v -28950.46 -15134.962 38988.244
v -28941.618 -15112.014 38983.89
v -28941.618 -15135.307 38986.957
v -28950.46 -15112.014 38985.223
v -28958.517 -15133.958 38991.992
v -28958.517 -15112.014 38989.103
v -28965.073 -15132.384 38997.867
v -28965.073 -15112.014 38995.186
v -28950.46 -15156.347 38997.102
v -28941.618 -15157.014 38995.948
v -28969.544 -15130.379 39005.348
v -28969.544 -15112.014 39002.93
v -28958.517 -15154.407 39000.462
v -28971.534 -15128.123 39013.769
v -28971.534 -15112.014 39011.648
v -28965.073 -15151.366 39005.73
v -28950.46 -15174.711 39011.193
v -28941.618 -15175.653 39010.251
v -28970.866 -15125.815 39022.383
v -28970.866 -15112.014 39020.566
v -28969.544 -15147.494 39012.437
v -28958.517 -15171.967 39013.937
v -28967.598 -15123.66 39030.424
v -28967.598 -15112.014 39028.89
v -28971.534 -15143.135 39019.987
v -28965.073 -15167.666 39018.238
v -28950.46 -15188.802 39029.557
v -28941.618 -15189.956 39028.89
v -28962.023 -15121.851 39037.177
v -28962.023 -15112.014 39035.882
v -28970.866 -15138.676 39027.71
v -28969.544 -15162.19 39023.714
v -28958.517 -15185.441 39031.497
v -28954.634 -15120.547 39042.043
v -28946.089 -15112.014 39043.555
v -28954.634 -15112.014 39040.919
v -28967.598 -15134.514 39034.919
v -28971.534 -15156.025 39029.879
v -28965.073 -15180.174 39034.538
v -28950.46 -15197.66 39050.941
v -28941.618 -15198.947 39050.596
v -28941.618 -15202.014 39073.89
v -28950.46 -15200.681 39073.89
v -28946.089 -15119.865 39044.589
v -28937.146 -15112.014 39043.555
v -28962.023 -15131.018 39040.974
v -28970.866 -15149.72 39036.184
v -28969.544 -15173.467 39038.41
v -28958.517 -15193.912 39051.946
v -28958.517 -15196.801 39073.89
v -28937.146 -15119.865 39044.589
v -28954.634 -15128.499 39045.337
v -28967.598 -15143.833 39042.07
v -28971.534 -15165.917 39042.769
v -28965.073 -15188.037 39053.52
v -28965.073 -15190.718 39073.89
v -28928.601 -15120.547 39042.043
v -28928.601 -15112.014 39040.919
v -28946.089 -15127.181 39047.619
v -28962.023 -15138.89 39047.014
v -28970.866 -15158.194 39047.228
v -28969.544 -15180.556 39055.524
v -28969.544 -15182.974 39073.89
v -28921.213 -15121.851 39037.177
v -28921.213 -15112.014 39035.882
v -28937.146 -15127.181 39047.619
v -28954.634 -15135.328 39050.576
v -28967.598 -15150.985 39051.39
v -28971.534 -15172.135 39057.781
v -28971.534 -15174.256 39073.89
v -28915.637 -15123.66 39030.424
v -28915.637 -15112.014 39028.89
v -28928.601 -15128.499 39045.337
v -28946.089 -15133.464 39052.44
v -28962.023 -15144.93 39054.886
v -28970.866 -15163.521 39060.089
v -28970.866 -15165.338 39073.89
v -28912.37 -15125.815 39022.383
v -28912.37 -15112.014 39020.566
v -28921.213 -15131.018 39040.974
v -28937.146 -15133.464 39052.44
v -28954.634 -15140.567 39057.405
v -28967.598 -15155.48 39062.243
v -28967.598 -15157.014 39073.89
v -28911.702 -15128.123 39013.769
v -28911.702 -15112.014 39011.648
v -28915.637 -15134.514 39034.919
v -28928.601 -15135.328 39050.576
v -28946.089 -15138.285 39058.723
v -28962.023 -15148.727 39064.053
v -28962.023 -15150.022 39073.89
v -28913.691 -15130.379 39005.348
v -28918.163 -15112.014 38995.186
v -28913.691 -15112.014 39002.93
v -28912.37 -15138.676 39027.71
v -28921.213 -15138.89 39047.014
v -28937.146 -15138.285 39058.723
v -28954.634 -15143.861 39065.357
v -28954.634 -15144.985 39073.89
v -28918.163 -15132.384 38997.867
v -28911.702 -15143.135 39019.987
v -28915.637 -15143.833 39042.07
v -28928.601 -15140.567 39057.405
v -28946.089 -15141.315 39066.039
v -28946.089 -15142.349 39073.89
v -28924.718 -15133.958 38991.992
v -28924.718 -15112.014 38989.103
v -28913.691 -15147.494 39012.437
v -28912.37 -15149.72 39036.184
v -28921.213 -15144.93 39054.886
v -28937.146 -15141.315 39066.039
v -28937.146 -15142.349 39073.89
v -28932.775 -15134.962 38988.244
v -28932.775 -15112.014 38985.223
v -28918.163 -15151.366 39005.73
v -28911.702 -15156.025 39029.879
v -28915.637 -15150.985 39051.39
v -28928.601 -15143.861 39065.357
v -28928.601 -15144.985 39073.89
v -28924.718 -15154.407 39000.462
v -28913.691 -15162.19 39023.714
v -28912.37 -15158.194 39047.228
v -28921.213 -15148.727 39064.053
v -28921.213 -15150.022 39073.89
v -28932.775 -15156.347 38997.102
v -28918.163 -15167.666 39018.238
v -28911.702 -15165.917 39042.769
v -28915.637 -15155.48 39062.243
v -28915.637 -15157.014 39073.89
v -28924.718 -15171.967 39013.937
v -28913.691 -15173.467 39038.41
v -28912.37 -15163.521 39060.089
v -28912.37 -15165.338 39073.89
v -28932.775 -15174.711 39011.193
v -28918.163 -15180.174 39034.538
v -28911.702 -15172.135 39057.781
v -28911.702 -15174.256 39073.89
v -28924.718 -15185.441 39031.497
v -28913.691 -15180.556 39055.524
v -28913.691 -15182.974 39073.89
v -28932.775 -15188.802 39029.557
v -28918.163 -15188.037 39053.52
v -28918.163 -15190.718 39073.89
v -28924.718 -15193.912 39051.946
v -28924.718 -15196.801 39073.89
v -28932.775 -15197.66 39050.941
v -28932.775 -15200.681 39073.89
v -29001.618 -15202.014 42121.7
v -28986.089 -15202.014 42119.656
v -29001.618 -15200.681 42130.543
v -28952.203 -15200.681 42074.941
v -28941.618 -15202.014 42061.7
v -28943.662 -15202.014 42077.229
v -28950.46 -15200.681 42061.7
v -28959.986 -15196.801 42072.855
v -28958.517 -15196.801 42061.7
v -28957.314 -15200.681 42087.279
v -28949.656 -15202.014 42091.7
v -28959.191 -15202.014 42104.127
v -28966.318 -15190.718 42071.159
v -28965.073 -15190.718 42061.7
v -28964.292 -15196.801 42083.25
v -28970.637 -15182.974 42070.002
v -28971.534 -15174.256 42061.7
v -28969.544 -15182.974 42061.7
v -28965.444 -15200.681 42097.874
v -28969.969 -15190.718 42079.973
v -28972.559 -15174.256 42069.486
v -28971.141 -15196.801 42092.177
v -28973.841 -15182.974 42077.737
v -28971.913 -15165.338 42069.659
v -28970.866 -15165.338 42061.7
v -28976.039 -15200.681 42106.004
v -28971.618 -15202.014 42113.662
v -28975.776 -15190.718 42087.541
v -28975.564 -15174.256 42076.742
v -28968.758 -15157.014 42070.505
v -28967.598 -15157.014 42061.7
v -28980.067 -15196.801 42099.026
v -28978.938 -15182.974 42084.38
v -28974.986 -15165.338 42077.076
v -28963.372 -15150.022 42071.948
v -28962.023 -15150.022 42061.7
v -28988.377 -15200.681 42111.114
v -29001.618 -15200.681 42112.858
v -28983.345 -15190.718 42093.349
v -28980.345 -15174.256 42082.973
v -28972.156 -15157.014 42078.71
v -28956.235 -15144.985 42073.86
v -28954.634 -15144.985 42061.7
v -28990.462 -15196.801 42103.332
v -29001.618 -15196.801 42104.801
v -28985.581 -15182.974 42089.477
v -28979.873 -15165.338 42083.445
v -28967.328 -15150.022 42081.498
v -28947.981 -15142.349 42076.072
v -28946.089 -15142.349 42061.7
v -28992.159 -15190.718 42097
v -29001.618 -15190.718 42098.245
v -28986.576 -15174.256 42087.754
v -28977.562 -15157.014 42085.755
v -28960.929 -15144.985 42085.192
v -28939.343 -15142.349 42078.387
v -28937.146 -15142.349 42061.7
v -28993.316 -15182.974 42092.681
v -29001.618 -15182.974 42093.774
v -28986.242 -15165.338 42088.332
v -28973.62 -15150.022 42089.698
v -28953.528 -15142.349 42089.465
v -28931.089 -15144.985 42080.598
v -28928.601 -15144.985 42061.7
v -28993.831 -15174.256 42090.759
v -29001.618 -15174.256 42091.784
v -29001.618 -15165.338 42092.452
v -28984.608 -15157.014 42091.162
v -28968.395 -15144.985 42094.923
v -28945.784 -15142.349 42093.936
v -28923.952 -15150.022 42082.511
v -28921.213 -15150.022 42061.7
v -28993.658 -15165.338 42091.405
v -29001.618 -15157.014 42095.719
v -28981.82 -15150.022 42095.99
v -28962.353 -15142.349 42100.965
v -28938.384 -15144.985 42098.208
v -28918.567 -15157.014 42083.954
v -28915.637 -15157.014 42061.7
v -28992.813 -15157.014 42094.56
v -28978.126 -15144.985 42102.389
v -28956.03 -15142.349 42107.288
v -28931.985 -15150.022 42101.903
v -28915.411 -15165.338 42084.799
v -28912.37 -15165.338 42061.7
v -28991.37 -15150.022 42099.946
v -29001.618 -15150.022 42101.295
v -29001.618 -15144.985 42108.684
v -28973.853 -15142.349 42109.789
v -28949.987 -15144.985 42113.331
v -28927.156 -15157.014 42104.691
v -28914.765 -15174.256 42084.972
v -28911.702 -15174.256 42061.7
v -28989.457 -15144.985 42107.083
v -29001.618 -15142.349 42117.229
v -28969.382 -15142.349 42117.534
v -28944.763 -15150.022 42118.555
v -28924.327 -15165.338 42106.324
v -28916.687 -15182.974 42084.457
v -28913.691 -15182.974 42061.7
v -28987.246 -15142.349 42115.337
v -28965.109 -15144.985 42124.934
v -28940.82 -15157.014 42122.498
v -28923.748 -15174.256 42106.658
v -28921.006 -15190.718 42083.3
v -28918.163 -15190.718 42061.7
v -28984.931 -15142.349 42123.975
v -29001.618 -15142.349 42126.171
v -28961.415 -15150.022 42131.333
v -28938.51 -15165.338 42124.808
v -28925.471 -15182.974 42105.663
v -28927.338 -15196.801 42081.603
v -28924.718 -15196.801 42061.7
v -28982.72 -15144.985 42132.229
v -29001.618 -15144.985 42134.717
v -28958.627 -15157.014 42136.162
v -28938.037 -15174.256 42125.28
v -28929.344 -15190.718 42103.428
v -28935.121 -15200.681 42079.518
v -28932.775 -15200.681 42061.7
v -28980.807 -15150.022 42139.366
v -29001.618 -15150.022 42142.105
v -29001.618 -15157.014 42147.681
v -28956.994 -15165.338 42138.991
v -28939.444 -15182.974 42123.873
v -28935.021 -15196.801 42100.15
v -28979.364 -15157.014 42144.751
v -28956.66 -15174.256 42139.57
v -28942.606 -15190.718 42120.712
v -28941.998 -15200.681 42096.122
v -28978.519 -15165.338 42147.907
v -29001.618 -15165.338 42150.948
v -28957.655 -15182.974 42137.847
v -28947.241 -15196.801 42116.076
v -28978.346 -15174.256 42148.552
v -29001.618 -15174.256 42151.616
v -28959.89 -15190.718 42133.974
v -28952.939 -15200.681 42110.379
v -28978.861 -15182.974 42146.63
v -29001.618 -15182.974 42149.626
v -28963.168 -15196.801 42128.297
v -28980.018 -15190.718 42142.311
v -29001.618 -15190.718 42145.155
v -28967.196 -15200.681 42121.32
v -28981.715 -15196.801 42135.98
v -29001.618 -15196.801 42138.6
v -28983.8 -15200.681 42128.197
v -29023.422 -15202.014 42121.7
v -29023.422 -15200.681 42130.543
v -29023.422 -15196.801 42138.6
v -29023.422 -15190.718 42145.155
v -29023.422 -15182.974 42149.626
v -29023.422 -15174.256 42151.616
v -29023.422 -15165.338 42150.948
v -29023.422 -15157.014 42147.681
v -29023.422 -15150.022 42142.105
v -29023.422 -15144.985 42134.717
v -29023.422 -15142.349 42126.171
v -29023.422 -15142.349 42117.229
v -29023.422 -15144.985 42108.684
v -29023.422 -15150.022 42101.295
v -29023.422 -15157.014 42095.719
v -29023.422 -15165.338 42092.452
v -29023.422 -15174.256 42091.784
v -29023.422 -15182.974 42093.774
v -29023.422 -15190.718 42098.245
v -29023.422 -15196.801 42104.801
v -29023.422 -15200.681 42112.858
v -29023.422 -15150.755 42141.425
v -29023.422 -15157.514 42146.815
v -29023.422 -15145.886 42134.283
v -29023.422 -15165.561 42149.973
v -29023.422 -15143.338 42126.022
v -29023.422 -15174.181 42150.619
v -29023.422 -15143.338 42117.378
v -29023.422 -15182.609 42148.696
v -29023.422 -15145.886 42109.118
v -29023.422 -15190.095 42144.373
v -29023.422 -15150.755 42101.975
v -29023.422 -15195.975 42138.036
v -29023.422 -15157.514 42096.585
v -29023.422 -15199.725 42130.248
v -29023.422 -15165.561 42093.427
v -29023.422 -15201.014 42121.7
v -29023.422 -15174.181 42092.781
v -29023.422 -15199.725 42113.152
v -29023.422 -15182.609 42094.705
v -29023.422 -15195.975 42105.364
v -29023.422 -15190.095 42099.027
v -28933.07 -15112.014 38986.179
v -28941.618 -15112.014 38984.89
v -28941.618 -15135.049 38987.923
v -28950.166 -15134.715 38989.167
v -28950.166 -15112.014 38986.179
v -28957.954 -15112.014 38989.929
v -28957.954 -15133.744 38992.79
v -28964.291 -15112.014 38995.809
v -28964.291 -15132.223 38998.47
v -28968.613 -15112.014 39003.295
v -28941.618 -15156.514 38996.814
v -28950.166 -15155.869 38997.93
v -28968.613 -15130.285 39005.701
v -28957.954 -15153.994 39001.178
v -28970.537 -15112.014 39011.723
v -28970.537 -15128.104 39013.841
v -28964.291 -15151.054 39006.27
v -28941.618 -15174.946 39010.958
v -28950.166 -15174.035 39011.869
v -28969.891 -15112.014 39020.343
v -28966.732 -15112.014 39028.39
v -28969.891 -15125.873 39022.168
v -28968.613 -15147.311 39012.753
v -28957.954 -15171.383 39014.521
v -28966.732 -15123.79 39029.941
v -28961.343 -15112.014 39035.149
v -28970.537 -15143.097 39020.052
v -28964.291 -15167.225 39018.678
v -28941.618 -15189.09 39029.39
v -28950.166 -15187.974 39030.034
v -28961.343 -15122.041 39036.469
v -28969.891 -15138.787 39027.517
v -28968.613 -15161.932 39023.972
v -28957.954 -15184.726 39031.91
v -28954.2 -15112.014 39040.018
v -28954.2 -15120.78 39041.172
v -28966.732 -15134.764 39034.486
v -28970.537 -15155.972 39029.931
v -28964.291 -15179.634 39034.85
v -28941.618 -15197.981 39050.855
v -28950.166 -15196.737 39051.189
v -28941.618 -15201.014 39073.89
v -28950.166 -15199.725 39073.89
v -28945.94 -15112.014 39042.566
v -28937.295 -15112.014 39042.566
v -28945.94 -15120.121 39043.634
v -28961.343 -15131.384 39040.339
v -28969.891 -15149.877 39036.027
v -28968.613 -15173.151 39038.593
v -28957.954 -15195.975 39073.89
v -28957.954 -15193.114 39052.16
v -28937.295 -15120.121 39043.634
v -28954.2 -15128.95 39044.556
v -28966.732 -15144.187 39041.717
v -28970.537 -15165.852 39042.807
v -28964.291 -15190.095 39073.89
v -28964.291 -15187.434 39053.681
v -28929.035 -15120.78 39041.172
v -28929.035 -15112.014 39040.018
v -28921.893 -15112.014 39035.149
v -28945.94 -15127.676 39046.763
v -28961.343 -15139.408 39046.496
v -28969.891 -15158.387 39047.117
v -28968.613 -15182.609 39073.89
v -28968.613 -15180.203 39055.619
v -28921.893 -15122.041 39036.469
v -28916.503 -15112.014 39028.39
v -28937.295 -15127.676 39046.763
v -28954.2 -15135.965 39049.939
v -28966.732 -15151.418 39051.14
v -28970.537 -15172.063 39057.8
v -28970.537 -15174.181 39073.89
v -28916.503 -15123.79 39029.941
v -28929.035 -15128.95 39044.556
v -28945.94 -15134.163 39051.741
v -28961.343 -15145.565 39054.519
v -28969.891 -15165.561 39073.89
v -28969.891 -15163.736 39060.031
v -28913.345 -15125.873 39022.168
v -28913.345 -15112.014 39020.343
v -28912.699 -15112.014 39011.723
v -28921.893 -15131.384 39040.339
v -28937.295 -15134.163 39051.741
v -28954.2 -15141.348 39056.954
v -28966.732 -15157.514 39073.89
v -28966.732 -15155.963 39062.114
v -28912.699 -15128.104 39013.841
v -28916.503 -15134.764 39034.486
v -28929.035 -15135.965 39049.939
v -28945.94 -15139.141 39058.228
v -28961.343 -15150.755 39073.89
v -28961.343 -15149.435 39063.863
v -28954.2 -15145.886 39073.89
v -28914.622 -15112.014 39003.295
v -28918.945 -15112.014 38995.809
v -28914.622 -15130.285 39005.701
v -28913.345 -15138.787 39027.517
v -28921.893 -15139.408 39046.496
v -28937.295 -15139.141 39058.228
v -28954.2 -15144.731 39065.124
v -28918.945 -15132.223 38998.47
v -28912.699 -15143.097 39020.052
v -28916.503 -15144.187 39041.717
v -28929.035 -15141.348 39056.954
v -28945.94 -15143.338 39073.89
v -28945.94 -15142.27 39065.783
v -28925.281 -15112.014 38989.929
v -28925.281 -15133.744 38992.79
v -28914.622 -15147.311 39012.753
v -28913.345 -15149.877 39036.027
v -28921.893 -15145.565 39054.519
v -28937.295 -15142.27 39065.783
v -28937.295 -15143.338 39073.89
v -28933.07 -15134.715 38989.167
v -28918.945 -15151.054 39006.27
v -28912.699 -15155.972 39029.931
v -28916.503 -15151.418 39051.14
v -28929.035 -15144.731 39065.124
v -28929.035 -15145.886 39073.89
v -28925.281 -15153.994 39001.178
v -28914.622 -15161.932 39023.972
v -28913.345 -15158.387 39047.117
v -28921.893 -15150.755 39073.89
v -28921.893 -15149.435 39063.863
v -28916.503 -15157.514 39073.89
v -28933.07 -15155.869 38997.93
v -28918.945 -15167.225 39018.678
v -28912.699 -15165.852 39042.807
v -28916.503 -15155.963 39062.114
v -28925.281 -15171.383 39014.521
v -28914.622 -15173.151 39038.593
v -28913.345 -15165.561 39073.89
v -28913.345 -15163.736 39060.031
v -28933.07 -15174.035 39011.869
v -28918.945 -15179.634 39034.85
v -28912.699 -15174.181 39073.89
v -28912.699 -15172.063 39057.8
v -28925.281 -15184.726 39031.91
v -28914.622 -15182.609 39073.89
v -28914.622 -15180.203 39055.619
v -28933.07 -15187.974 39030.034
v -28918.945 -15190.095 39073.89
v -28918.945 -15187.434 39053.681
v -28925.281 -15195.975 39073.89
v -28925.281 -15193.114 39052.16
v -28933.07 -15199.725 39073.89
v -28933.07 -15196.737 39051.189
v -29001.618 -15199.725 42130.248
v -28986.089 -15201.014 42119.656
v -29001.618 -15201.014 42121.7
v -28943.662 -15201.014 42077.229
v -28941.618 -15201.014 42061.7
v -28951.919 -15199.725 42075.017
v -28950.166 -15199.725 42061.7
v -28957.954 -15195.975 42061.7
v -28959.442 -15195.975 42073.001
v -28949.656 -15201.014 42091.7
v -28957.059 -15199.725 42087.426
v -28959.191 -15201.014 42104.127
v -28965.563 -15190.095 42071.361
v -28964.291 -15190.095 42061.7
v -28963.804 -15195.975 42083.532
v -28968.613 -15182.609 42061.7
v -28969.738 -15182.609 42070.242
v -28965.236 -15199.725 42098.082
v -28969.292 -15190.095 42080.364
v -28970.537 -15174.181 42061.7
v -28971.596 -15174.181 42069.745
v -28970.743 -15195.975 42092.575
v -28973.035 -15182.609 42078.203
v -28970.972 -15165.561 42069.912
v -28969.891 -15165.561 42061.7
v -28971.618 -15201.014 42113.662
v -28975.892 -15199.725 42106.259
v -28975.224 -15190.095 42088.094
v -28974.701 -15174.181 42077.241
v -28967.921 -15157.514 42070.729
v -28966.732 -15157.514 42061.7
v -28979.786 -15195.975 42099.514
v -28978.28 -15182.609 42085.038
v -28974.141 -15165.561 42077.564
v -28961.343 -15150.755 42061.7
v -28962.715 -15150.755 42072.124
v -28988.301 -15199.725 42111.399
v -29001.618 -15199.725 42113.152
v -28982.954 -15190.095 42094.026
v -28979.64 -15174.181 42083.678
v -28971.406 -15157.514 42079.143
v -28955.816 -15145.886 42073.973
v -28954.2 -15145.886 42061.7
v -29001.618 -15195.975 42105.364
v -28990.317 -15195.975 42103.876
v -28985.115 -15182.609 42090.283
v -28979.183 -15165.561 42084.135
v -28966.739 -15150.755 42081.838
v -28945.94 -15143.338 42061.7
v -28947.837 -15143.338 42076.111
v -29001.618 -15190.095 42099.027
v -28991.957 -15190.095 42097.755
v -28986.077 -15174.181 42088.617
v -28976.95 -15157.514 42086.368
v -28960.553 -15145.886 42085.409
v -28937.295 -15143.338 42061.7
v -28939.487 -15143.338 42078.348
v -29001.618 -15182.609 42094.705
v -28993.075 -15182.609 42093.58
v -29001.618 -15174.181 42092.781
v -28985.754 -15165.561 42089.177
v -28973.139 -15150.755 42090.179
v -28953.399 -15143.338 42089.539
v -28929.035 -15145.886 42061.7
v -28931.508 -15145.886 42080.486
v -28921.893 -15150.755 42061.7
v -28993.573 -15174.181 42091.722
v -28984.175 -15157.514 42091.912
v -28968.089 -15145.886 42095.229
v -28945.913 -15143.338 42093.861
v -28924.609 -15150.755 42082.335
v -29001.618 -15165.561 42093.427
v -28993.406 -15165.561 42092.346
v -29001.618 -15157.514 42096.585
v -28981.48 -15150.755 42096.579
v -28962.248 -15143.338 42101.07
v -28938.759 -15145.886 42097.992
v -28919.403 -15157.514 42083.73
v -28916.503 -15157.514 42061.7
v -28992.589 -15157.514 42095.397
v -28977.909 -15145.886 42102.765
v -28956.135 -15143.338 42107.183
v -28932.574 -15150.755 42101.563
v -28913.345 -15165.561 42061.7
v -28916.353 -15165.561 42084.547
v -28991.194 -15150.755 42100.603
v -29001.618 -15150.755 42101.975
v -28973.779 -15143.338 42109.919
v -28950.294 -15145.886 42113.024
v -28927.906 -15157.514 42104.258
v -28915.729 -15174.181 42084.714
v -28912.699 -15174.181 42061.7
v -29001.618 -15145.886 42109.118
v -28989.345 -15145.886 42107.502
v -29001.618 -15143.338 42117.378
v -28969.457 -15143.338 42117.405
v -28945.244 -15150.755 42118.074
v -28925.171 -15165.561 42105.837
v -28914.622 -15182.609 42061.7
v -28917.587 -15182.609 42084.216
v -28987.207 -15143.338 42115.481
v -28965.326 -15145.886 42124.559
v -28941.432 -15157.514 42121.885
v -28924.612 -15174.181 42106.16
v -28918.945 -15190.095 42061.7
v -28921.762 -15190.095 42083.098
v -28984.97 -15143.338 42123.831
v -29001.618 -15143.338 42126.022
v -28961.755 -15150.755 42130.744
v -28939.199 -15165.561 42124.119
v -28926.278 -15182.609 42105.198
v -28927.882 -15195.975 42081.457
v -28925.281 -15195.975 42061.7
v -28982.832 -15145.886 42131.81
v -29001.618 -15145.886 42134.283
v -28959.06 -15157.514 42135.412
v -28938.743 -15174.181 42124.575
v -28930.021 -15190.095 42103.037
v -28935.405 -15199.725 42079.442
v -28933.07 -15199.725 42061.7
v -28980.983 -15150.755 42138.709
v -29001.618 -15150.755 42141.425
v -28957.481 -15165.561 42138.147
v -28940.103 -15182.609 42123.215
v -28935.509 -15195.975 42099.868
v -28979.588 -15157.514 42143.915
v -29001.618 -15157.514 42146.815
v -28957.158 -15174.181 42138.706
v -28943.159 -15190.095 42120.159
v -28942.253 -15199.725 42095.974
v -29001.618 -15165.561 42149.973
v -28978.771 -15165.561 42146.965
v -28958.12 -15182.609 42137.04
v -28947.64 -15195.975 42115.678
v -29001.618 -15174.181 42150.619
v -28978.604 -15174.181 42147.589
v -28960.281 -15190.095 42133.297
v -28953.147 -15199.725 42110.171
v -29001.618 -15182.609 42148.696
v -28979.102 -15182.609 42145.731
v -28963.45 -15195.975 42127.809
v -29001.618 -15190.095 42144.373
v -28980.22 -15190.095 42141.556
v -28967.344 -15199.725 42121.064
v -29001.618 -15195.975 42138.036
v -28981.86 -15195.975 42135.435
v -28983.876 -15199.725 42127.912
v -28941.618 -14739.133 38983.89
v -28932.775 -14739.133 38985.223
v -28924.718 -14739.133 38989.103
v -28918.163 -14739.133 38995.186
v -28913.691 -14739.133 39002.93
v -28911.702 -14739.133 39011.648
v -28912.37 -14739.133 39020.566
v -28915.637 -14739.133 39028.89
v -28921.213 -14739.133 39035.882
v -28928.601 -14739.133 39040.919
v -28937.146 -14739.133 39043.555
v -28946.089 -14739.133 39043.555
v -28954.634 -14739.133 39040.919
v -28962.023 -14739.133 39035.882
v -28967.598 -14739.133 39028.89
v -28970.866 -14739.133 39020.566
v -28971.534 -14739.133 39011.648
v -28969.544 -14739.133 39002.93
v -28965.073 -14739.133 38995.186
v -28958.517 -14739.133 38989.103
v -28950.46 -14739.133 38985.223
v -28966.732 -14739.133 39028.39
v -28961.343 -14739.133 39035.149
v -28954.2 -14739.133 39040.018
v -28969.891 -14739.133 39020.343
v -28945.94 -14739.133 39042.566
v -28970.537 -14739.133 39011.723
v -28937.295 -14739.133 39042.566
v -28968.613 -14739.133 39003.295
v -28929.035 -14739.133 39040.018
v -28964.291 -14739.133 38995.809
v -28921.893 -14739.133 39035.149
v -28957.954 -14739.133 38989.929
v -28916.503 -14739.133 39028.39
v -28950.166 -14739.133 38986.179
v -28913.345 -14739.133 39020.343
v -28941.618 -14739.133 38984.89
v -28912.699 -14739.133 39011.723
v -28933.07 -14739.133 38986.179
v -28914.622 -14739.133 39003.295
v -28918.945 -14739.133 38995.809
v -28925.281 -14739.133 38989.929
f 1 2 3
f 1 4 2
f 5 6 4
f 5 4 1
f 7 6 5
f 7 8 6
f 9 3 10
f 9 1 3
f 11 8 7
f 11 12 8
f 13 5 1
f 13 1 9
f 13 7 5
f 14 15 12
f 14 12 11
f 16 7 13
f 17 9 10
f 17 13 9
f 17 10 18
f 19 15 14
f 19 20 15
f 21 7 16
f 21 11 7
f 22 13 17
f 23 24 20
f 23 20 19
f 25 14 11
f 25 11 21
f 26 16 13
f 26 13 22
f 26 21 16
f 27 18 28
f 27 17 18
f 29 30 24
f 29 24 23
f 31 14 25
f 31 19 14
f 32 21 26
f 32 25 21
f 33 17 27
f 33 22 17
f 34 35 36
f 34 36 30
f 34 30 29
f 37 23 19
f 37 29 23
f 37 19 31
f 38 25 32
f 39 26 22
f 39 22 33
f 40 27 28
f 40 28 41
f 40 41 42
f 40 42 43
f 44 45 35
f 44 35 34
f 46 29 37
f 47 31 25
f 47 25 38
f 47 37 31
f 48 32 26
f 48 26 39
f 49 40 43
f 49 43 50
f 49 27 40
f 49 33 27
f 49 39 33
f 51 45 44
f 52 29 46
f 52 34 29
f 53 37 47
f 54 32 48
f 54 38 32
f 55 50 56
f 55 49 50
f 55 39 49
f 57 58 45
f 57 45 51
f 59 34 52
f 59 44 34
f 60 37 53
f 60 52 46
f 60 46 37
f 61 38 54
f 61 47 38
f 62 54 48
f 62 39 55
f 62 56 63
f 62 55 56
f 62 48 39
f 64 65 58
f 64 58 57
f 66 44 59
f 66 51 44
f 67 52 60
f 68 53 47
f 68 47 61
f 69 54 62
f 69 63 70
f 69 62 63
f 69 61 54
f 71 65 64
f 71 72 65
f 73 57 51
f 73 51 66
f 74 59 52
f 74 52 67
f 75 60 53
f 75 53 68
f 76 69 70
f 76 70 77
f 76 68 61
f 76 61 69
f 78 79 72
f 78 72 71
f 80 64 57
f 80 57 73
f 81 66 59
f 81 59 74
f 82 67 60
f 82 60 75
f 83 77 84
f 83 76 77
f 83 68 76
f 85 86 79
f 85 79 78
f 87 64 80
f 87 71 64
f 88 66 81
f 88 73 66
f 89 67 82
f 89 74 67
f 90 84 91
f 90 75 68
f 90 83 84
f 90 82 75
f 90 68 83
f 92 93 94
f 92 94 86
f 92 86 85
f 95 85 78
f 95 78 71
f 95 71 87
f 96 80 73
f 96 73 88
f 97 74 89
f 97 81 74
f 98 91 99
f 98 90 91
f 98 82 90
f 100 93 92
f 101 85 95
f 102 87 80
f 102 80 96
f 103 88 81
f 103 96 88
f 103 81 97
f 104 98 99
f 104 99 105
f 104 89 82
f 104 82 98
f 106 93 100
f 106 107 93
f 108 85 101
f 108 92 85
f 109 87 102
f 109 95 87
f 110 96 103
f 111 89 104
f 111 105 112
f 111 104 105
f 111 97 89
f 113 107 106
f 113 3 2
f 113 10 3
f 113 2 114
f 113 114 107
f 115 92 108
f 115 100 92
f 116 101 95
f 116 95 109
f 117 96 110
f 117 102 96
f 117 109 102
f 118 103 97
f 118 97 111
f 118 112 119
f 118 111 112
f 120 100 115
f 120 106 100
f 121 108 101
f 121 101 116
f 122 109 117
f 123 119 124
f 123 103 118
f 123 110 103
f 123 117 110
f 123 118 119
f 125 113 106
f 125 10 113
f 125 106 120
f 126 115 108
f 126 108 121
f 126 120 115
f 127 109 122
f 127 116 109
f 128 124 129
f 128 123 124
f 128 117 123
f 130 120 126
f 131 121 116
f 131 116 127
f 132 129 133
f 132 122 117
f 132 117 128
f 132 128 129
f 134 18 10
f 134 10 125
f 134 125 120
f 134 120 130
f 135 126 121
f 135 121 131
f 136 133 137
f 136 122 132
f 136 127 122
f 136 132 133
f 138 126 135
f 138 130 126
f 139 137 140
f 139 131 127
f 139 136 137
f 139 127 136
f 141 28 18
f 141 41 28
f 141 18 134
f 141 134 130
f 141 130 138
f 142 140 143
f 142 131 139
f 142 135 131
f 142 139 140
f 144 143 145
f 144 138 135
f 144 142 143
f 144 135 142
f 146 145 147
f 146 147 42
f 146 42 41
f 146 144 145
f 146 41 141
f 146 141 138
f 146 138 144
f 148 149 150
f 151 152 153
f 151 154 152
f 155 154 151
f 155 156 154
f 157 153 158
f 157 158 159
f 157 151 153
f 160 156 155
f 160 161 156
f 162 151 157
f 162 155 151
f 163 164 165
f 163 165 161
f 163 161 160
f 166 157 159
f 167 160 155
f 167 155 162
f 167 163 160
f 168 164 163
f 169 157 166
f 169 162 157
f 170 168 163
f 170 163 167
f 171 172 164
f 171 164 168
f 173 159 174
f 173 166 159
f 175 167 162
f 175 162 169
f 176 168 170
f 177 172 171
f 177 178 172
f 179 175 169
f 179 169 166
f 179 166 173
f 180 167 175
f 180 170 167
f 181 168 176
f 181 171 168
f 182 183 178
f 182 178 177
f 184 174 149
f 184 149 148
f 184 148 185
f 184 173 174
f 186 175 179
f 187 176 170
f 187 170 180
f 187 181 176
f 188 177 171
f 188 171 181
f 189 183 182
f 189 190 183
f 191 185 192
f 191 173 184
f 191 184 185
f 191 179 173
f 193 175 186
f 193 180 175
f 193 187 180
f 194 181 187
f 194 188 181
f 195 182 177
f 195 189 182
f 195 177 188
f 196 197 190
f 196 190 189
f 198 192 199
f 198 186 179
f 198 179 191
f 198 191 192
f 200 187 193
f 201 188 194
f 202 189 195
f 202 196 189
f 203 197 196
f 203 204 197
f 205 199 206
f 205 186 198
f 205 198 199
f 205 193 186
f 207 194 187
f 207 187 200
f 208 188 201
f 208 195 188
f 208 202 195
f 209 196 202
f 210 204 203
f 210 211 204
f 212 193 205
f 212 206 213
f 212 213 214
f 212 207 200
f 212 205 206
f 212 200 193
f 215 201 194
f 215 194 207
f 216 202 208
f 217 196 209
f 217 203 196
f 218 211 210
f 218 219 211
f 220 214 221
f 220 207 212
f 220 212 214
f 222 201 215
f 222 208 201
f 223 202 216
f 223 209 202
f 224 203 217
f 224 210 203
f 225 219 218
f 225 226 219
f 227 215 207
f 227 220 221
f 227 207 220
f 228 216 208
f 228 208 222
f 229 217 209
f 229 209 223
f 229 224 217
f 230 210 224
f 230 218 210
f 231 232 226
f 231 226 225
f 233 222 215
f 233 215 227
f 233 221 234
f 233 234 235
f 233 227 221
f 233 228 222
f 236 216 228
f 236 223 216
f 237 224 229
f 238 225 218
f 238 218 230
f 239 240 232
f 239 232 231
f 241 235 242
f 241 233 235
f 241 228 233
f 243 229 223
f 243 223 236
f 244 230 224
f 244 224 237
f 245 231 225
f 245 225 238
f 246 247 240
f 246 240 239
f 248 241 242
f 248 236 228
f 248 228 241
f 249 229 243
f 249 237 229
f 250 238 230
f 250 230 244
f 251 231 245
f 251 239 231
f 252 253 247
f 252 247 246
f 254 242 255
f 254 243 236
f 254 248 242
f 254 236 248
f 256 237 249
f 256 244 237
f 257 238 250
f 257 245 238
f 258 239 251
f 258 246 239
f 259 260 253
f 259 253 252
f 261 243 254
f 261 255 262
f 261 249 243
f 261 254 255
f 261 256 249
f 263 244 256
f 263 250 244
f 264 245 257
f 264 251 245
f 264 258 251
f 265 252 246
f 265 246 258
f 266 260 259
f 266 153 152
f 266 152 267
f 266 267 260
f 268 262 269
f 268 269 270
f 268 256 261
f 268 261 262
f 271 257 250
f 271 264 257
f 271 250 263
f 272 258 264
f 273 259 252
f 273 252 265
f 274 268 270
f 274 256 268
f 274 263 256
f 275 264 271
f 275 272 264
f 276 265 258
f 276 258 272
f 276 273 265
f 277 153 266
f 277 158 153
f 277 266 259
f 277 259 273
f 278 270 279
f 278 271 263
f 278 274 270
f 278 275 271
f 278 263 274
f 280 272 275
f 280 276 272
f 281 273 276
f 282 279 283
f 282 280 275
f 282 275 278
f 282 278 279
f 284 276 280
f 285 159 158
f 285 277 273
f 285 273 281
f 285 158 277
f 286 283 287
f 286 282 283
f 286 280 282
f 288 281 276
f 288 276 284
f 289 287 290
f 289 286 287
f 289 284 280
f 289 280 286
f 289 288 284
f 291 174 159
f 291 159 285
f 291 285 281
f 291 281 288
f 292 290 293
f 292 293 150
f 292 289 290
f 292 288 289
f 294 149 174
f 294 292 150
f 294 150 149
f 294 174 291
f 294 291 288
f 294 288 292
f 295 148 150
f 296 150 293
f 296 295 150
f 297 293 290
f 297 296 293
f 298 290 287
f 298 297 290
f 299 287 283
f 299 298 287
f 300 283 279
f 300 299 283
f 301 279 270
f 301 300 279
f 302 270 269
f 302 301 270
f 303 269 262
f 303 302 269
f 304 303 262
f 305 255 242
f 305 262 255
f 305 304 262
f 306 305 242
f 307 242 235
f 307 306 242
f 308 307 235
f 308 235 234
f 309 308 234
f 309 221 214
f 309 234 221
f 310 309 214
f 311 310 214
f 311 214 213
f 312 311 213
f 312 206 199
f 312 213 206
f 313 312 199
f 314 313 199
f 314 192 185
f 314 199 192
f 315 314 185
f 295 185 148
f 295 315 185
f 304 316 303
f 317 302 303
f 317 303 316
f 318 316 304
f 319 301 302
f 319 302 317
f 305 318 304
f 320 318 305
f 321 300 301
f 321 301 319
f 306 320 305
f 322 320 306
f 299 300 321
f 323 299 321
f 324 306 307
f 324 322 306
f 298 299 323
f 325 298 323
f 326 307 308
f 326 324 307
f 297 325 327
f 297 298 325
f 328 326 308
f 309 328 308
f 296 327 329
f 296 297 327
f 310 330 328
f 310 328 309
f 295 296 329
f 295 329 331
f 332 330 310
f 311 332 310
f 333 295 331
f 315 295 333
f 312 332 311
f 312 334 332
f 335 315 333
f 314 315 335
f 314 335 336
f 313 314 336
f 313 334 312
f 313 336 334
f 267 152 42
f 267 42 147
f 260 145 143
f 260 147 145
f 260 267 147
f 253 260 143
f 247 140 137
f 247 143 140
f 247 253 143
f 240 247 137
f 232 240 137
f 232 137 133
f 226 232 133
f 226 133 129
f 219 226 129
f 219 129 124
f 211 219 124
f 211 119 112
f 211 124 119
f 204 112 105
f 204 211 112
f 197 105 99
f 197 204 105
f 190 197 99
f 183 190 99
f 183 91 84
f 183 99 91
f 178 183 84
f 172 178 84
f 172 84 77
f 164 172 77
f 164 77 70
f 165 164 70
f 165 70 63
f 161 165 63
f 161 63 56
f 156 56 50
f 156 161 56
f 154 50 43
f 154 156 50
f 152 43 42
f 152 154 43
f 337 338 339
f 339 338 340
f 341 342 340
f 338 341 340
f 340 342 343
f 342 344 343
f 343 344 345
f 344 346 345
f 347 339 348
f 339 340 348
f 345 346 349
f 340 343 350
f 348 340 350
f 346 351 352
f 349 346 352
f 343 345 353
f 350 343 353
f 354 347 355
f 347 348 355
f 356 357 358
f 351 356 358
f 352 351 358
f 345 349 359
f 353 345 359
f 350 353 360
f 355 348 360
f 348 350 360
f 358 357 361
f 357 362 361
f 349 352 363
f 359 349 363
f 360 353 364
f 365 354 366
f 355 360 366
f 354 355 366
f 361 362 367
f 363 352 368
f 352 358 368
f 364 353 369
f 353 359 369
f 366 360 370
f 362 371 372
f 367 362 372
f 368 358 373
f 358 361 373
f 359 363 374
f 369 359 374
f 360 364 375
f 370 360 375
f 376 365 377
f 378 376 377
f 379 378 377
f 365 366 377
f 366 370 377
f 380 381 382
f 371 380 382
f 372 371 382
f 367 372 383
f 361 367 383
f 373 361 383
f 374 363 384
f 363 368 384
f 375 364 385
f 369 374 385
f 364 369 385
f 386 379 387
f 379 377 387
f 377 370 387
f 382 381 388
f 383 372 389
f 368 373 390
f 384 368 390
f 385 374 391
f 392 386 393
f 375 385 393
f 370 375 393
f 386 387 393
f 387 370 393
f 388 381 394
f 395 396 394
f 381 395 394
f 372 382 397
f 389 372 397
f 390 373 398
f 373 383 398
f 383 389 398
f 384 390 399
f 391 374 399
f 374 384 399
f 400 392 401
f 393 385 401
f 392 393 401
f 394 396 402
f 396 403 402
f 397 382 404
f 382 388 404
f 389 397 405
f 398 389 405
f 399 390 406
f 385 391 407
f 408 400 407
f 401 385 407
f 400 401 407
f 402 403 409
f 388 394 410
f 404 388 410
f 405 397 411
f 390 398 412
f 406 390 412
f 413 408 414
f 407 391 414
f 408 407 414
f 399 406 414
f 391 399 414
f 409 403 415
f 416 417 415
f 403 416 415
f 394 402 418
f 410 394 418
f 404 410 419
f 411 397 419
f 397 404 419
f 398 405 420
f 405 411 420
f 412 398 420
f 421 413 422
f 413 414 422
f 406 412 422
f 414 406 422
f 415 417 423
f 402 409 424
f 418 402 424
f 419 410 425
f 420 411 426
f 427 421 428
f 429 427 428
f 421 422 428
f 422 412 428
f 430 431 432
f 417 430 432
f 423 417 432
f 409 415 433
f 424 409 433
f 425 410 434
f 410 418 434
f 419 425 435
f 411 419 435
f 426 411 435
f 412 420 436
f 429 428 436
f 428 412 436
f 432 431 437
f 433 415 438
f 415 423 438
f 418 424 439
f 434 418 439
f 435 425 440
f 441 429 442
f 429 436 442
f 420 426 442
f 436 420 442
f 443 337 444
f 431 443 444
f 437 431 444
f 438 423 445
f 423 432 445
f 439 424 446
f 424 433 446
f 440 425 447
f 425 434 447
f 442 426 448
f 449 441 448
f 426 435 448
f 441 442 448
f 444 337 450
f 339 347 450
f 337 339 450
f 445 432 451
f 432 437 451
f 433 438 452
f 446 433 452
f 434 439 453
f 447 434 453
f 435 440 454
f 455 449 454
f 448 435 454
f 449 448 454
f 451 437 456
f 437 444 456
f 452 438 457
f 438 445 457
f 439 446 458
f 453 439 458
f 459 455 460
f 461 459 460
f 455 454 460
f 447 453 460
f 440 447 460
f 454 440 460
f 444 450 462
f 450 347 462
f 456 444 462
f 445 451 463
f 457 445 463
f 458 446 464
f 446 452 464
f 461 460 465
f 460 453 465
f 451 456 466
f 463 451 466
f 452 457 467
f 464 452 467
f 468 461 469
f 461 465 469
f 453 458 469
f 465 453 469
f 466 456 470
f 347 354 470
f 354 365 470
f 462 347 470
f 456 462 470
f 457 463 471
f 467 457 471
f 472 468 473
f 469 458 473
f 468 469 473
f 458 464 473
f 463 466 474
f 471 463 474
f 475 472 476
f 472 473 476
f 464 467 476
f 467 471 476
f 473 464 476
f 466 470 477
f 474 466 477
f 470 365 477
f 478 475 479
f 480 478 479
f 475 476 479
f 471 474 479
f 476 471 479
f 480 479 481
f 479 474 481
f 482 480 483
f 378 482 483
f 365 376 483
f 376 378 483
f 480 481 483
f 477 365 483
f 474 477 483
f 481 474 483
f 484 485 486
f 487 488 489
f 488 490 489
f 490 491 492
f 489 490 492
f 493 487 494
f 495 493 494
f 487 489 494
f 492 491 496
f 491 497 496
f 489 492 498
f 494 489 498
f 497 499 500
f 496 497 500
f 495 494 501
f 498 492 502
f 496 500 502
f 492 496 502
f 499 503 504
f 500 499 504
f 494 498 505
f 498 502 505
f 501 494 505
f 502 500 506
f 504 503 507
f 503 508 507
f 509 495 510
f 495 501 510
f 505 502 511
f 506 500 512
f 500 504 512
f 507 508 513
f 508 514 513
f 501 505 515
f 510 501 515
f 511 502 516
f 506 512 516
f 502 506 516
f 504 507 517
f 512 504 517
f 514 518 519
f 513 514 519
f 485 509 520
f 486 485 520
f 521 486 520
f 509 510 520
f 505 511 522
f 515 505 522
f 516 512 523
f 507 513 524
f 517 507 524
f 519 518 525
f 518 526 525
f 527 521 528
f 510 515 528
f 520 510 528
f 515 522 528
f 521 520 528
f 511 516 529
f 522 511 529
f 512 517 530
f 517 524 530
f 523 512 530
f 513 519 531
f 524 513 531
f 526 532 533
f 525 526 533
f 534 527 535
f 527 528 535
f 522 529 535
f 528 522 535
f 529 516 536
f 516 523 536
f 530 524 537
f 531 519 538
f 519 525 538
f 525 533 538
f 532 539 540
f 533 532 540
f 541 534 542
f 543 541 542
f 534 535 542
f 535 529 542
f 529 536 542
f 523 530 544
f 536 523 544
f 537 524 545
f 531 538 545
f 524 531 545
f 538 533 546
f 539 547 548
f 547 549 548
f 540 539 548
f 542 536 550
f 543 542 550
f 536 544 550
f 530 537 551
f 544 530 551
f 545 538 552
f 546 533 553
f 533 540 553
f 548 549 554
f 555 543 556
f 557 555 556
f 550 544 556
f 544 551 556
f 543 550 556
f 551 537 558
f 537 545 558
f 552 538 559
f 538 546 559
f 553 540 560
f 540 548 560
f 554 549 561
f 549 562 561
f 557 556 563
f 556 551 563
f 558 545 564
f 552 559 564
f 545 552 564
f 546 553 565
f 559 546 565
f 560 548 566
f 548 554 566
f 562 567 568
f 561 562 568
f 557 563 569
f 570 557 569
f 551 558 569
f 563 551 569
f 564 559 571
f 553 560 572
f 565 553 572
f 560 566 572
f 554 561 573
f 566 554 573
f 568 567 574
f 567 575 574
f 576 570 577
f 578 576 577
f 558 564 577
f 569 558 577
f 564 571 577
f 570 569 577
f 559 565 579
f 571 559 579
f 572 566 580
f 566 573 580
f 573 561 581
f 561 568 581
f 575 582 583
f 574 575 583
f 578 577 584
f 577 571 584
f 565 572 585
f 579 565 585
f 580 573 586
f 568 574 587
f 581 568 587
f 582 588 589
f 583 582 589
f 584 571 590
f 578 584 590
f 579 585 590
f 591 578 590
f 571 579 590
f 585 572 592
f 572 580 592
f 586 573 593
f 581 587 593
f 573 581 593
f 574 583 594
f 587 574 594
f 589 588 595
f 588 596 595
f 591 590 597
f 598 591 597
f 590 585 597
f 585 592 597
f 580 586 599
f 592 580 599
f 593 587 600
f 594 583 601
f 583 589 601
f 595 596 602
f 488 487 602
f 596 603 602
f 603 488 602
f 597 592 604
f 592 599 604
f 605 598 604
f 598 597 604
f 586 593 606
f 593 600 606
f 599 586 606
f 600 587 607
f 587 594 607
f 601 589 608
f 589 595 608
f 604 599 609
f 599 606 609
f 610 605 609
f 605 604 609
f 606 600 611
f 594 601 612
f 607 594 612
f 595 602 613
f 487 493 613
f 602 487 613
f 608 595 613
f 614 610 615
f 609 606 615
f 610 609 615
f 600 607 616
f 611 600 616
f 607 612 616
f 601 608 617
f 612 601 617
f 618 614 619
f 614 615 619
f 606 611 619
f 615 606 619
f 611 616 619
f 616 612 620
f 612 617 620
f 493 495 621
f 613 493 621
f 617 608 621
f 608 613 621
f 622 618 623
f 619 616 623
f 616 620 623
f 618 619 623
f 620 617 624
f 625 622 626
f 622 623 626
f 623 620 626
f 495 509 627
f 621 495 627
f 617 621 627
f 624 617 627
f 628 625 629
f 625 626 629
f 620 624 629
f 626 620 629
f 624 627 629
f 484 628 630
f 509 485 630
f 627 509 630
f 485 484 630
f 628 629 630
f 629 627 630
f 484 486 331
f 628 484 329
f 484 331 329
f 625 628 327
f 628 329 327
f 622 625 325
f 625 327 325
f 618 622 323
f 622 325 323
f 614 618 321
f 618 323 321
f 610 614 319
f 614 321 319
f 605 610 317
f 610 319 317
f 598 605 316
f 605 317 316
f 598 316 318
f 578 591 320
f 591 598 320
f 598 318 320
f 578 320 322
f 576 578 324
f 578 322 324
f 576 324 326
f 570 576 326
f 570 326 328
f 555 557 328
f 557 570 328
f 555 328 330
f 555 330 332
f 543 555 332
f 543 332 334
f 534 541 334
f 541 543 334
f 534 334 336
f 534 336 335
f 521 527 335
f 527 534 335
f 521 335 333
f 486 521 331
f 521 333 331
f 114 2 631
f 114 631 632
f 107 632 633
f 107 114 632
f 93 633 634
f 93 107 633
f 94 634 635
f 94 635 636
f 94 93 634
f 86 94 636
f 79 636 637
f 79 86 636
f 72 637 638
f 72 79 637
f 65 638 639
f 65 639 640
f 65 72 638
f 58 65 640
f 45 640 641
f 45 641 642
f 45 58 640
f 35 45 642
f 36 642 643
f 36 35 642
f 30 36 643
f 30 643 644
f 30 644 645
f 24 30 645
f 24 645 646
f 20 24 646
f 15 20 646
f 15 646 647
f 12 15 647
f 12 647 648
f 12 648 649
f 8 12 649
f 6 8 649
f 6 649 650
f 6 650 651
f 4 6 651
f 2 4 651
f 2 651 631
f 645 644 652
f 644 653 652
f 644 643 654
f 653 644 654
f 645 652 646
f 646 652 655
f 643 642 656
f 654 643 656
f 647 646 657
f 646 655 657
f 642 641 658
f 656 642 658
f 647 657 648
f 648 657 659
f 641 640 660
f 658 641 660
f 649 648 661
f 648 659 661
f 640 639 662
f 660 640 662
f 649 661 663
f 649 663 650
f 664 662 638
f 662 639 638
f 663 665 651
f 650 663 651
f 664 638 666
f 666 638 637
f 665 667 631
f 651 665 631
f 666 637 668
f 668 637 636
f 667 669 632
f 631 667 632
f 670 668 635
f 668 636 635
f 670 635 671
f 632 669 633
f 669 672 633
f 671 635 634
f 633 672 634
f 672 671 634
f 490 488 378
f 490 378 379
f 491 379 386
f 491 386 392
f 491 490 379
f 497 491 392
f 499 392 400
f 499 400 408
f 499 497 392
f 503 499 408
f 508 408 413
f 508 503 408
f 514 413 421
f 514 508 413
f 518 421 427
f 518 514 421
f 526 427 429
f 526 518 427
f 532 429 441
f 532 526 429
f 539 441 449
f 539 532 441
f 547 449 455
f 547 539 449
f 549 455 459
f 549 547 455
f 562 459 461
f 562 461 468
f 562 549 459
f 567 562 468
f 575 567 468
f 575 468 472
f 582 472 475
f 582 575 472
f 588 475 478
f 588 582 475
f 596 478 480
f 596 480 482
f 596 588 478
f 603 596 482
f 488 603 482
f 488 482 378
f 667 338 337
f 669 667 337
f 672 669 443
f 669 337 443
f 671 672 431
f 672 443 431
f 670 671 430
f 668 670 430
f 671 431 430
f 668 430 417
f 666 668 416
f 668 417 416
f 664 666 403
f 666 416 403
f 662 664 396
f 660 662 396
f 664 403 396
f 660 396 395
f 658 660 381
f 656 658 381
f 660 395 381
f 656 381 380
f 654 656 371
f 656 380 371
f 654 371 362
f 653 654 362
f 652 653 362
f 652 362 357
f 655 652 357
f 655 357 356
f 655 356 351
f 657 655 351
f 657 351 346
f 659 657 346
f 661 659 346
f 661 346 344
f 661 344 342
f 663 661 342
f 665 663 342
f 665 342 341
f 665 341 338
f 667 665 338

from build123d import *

# Parameters (mm, degrees)
SWEEP_THIN1_PROFILE_R   = 30
SWEEP_THIN1_PROFILE_R_2 = 29


with BuildPart() as part:
    # Sweep-Thin1: sweep along a curve in space
    with BuildLine() as sweep_thin1_path:
        Line((-28941.617683291, -14739.133353414, 39013.890196057), (-28941.617683291, -15112.013633935, 39013.890196057))
        ThreePointArc((-28941.617683291, -15172.013633935, 39073.890196057), (-28941.617683291, -15154.440040806, 39031.463789186), (-28941.617683291, -15112.013633935, 39013.890196057))
        Line((-28941.617683291, -15172.013633935, 39073.890196057), (-28941.617683291, -15172.013633935, 42061.700196057))
        ThreePointArc((-28941.617683291, -15172.013633935, 42061.700196057), (-28959.19127642, -15172.013633935, 42104.126602928), (-29001.617683291, -15172.013633935, 42121.700196057))
        Line((-29001.617683291, -15172.013633935, 42121.700196057), (-29023.421998341, -15172.013633935, 42121.700196057))
    # Sweep-Thin1 profile (on start of the path) → Sweep-Thin1 (sweep)
    with BuildSketch(Plane(origin=(-28941.617683291, -14739.133353414, 39013.890196057), x_dir=(0, 0, -1), z_dir=(0, -1, 0))):
        Circle(SWEEP_THIN1_PROFILE_R)
        Circle(SWEEP_THIN1_PROFILE_R_2, mode=Mode.SUBTRACT)
    sweep(path=sweep_thin1_path.line)


solid = part.part
